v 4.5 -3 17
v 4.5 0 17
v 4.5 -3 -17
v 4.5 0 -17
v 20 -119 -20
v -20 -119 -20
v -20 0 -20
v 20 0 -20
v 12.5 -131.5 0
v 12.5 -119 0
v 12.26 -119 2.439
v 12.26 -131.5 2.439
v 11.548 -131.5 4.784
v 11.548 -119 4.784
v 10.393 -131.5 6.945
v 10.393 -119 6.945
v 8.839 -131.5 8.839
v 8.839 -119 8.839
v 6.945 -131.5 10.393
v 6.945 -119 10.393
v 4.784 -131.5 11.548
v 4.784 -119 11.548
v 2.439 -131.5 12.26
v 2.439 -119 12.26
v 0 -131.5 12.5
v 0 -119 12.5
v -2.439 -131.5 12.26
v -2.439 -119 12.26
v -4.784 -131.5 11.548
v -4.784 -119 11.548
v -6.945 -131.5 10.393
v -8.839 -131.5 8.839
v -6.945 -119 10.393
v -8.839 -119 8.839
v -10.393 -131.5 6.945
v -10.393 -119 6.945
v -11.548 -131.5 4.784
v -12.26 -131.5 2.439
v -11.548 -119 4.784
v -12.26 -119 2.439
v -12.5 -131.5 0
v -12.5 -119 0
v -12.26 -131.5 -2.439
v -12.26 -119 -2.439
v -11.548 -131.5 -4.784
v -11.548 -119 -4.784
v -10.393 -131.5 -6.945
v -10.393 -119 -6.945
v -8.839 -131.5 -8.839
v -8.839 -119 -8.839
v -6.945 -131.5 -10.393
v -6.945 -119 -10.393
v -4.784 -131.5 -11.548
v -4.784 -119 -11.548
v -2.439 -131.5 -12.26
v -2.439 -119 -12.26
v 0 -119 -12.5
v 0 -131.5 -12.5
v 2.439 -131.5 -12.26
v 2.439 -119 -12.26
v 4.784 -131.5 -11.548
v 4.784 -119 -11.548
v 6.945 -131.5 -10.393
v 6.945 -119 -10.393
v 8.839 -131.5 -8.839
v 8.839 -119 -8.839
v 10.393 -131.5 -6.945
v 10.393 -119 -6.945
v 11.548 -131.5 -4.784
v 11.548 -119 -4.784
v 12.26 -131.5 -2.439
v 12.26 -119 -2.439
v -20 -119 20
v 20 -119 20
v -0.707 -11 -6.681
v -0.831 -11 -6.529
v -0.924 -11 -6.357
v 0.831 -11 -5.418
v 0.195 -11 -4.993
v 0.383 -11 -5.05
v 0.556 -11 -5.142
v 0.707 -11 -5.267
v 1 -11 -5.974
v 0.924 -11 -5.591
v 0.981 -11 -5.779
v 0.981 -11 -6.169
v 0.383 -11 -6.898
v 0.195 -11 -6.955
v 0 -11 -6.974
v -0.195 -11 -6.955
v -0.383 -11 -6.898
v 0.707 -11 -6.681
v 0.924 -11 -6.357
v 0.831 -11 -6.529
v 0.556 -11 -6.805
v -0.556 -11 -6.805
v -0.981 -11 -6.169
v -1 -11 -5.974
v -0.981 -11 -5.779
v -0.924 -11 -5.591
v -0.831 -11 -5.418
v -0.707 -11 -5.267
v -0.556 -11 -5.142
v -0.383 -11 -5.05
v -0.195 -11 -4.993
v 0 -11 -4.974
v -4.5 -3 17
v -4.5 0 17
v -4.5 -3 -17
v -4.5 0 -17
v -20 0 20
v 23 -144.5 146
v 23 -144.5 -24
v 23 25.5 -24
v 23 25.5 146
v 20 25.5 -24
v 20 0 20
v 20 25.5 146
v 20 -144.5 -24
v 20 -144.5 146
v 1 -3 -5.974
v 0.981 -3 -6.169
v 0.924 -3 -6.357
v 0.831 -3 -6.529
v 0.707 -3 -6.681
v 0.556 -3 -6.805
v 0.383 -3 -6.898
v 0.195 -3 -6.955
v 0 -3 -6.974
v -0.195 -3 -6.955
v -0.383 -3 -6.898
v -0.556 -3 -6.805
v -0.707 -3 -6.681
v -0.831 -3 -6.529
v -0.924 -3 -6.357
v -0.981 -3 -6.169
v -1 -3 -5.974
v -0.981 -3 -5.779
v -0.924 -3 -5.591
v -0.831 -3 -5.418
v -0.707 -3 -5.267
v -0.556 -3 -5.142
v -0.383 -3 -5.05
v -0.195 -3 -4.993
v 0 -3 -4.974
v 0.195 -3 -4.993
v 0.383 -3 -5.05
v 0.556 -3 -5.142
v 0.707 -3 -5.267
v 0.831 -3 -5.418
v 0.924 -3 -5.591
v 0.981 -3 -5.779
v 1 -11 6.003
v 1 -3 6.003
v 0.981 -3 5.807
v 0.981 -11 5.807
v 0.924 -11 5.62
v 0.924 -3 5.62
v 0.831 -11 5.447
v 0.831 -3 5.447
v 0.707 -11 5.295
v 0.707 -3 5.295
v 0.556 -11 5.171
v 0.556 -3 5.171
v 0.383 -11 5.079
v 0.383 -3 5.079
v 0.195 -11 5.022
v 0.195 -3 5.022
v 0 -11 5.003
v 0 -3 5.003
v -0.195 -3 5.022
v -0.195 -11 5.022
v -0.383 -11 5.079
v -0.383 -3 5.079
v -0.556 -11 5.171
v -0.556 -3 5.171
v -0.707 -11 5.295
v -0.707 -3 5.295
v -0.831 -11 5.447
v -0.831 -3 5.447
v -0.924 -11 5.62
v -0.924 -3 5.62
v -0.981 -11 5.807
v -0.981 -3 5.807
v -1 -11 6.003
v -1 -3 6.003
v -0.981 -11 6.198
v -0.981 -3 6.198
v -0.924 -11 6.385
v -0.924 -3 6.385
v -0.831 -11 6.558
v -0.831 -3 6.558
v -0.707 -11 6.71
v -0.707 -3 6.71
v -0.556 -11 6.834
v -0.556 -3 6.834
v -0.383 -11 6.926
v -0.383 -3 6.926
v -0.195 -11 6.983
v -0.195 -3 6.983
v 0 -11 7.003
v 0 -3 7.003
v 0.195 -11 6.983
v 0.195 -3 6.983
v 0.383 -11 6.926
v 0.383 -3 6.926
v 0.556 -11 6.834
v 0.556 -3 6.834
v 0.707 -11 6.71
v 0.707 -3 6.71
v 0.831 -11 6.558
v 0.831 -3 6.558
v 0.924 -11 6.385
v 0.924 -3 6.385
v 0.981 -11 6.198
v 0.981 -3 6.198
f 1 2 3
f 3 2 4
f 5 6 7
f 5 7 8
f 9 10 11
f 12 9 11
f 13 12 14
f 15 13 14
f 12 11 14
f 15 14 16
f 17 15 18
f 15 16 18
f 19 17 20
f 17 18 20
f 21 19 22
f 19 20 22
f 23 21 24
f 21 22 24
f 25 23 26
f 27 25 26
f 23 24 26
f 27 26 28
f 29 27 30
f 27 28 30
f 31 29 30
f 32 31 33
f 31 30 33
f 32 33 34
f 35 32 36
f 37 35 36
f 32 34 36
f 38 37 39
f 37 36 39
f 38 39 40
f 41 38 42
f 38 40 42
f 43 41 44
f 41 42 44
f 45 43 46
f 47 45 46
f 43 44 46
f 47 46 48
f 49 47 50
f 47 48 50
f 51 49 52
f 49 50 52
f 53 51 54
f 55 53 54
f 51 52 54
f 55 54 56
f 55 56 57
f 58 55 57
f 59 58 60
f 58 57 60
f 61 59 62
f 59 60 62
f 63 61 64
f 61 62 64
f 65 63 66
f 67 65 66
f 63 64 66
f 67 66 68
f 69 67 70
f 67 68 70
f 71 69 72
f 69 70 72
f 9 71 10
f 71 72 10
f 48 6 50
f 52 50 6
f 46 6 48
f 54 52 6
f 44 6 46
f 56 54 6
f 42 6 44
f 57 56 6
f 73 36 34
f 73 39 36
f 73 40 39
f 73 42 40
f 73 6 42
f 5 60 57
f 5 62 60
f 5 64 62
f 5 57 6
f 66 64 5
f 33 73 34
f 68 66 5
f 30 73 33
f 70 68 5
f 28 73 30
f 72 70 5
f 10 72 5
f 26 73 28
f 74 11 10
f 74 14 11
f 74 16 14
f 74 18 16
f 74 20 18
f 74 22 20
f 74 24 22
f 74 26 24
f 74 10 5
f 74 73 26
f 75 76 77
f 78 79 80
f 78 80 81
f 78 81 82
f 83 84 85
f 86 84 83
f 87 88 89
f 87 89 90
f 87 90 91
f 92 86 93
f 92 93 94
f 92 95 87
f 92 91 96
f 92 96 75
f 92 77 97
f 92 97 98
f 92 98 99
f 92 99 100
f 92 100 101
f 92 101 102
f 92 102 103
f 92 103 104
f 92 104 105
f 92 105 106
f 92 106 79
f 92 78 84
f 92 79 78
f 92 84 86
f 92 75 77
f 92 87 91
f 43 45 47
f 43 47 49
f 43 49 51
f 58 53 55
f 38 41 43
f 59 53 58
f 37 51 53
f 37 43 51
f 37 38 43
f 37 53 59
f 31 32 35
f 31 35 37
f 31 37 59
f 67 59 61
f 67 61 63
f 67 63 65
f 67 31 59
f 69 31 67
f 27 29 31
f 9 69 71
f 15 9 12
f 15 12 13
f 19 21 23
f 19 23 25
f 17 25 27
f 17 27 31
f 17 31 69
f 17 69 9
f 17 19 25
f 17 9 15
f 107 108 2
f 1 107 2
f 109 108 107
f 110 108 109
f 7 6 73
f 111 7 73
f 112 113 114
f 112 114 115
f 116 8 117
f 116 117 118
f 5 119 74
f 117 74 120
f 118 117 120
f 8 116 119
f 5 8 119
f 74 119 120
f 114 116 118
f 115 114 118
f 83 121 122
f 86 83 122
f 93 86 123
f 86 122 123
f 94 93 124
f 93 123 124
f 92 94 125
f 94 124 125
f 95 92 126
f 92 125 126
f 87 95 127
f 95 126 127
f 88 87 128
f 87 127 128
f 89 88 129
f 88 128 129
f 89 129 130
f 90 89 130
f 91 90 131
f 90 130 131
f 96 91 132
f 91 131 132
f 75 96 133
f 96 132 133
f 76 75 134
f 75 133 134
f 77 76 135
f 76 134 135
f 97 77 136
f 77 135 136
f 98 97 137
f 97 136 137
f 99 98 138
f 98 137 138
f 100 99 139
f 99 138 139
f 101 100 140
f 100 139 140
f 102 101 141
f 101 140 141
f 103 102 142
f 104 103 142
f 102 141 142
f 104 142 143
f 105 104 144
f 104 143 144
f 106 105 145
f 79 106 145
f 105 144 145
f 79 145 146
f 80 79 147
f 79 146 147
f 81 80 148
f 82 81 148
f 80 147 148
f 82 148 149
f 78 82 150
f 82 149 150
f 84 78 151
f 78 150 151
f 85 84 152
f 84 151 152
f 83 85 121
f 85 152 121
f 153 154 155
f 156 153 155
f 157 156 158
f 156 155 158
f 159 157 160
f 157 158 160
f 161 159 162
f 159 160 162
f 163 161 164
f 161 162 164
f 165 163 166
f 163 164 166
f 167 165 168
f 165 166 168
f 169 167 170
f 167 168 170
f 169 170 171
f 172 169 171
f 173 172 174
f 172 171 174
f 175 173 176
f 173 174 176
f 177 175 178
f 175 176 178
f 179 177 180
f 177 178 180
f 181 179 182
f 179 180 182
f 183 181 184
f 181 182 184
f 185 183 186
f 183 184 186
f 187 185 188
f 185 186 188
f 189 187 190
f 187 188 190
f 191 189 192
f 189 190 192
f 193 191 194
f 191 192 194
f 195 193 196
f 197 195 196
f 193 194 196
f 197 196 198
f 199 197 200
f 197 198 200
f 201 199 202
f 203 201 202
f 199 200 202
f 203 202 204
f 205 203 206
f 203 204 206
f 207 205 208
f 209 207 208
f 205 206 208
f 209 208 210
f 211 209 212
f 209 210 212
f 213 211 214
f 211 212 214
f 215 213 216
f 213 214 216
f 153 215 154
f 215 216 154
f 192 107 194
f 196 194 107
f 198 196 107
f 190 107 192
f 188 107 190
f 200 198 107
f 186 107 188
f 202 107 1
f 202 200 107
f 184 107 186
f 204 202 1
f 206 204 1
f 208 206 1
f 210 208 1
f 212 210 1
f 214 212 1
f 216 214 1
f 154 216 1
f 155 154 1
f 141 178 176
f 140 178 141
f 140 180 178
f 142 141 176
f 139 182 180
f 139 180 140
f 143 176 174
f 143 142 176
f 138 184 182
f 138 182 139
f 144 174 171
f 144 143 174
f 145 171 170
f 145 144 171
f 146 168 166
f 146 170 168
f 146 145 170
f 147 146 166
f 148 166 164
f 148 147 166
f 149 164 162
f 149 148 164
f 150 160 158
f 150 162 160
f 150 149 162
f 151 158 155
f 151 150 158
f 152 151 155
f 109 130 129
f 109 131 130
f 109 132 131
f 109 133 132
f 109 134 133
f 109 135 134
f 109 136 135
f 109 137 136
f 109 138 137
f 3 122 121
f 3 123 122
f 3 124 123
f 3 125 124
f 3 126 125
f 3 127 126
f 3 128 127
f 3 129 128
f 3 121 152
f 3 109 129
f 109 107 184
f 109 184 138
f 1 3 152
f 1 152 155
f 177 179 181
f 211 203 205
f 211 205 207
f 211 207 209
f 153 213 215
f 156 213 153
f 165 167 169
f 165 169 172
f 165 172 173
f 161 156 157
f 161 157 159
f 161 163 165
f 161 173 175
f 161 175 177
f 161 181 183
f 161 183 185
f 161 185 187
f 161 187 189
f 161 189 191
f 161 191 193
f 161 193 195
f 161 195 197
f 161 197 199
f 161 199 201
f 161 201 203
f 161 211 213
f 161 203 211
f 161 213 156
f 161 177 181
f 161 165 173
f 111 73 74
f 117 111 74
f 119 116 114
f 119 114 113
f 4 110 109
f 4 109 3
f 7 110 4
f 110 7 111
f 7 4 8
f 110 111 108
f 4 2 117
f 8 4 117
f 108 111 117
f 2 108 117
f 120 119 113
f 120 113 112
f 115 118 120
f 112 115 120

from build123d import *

# Parameters (mm, degrees)
SKETCH_W        = 40
SKETCH_H        = 40
PAD_DEPTH       = 119
SKETCH001_R     = 12.5
PAD001_DEPTH    = 12.5
SKETCH002_W     = 9
SKETCH002_H     = 34
POCKET_DEPTH    = 3
SKETCH003_R     = 1
POCKET001_DEPTH = 8
SKETCH004_W     = 170
SKETCH004_H     = 170
PAD002_DEPTH    = 3


with BuildPart() as part:
    # Sketch → Pad (new body)
    with BuildSketch(Plane.XZ):
        Rectangle(SKETCH_W, SKETCH_H)
    extrude(amount=PAD_DEPTH)

    # Sketch001 (on Face6 of Pad) → Pad001 (join)
    with BuildSketch(Plane.XZ.offset(119)):
        Circle(SKETCH001_R)
    extrude(amount=PAD001_DEPTH)

    # Sketch002 (on Face4 of Pad001) → Pocket (cut)
    with BuildSketch(Plane(origin=(0, 0, 0), x_dir=(1, 0, 0), z_dir=(0, 1, 0))):
        Rectangle(SKETCH002_W, SKETCH002_H)
    extrude(amount=-POCKET_DEPTH, mode=Mode.SUBTRACT)

    # Sketch003 (on Face12 of Pocket) → Pocket001 (cut)
    with BuildSketch(Plane(origin=(0, -3, 0), x_dir=(1, 0, 0), z_dir=(0, 1, 0))):
        with Locations((0, 5.973904)):
            Circle(SKETCH003_R)
        with Locations((0, -6.00258)):
            Circle(SKETCH003_R)
    extrude(amount=-POCKET001_DEPTH, mode=Mode.SUBTRACT)

    # Sketch004 (on Face3 of Pocket001) → Pad002 (join)
    with BuildSketch(Plane(origin=(20, 0, 0), x_dir=(0, 0, 1), z_dir=(1, 0, 0))):
        with Locations((61, 59.5)):
            Rectangle(SKETCH004_W, SKETCH004_H)
    extrude(amount=PAD002_DEPTH)


solid = part.part
